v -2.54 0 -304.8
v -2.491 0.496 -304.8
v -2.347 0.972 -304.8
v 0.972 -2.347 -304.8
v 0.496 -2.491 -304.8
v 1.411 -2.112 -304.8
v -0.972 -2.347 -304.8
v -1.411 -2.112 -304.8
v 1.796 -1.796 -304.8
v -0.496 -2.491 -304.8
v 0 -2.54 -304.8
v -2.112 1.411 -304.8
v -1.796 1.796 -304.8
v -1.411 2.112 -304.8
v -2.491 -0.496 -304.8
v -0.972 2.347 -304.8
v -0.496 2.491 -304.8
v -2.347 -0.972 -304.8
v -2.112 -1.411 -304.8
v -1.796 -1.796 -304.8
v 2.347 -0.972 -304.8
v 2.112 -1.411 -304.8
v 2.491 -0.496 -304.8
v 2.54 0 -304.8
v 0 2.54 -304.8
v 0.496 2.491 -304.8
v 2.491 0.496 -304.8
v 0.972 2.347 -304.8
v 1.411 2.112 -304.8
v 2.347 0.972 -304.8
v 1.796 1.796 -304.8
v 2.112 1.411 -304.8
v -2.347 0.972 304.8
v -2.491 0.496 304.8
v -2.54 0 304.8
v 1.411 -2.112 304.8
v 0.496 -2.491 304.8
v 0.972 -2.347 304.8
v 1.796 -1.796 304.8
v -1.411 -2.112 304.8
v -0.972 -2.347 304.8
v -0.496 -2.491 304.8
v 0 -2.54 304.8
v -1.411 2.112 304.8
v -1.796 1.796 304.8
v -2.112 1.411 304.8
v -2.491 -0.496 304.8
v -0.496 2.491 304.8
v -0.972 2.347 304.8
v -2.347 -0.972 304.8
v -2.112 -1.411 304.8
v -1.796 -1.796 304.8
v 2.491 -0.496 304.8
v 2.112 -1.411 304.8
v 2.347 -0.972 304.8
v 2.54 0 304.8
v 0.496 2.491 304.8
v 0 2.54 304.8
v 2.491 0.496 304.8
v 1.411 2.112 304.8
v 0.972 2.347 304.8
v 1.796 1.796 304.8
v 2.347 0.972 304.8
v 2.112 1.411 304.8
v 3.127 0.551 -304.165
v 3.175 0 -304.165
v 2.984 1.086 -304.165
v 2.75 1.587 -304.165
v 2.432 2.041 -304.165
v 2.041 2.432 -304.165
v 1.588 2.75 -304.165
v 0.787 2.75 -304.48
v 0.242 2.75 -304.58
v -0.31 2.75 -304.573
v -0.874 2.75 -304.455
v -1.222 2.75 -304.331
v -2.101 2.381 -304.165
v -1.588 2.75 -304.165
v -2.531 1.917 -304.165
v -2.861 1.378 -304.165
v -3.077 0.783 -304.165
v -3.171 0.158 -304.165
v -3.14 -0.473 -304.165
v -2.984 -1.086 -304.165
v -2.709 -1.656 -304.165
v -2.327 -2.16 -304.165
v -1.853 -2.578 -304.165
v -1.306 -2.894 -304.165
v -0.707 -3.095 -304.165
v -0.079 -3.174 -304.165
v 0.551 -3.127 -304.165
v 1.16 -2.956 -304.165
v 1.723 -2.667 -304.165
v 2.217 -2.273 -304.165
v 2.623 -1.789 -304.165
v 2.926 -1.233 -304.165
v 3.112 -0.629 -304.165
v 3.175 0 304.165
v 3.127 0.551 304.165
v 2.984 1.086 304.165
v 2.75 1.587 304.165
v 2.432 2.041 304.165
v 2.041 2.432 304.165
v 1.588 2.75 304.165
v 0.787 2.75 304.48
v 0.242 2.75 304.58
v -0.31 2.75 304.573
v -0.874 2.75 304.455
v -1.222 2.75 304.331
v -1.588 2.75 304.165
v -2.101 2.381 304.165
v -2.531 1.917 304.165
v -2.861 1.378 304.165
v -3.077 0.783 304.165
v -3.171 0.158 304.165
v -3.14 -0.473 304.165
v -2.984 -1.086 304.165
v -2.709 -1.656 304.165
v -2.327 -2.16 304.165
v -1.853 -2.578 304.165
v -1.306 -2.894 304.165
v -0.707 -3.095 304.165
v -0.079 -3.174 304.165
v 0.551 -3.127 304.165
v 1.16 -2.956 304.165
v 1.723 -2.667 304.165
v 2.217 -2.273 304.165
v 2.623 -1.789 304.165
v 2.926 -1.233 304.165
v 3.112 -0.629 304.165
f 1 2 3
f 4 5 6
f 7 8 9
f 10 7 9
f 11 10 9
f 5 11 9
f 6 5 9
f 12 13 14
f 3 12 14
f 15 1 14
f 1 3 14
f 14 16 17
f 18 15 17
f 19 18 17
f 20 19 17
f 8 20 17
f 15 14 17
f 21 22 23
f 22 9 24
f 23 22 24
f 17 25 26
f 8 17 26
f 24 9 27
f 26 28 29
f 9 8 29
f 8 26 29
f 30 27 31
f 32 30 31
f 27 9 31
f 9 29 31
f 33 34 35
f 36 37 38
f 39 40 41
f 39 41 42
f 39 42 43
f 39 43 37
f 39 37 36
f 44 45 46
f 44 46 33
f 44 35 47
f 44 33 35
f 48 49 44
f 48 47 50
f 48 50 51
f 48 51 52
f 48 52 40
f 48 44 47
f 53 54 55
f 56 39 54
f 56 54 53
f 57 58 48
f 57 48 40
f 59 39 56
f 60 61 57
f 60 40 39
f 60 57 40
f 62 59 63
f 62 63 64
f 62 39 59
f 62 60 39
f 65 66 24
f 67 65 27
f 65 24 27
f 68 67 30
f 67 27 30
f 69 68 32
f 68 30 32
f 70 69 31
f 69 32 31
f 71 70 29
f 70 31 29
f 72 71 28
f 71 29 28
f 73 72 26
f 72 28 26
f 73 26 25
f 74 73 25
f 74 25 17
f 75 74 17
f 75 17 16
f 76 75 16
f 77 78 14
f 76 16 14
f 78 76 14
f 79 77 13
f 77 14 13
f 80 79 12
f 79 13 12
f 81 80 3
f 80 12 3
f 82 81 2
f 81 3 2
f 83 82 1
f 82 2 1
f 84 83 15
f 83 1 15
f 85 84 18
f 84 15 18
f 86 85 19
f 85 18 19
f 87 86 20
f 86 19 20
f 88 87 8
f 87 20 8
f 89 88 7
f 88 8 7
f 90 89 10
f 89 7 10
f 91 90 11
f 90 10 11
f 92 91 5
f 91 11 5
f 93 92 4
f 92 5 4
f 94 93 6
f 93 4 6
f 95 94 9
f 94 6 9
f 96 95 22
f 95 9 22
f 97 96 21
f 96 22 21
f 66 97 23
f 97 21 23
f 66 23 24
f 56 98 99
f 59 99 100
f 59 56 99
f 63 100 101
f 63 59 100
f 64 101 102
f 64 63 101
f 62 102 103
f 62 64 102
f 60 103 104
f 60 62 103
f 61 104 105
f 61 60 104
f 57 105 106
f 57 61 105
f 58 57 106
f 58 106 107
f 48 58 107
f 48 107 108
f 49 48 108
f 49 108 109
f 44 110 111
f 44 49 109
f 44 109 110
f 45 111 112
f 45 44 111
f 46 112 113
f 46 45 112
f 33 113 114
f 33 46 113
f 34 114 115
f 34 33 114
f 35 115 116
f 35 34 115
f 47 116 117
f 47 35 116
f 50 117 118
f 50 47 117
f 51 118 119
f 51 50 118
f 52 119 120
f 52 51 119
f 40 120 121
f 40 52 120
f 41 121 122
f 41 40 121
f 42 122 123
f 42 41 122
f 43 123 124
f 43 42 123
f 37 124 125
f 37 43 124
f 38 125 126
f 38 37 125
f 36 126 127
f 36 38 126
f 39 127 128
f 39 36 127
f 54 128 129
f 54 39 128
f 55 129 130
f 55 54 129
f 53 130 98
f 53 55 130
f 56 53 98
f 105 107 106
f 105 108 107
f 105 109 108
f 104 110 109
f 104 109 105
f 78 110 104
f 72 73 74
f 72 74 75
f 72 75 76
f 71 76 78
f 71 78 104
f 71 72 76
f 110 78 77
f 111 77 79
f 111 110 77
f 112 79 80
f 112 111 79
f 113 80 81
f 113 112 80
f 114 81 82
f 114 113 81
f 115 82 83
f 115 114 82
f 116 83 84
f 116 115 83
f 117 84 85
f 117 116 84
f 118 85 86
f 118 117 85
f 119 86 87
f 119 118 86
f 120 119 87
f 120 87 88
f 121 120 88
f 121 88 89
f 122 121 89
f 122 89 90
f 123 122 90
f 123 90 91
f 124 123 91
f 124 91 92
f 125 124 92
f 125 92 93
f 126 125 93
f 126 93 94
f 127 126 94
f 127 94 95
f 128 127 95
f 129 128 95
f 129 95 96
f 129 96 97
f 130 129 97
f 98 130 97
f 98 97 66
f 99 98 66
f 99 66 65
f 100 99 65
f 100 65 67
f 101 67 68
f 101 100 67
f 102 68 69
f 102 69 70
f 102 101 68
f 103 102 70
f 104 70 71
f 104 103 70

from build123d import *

# Parameters (mm, degrees)
SKETCH1_R           = 3.175
EXTRUDE1_DEPTH      = 304.8
CHAMFER1_SIZE       = 0.635
EXTRUDE7_DEPTH      = 305.8
EXTRUDE7_DEPTH_BACK = 305.8


with BuildPart() as part:
    # Sketch1 → Extrude1 (new body, symmetric)
    with BuildSketch(Plane.XY):
        Circle(SKETCH1_R)
    extrude(amount=EXTRUDE1_DEPTH, both=True)

    # Chamfer1
    chamfer1_edges = [part.edges().sort_by_distance(p)[0] for p in [
        (-3.175, 0, -304.8),
        (-3.175, 0, 304.8),
    ]]
    chamfer(chamfer1_edges, length=CHAMFER1_SIZE)

    # Sketch13 → Extrude7 (cut, two sides)
    with BuildSketch(Plane.XY) as extrude7_sk:
        with BuildLine():
            Line((-1.5875, 2.749630657), (1.5875, 2.749630657))
            ThreePointArc((1.5875, 2.749630657), (0, 3.175), (-1.5875, 2.749630657))
        make_face()
    extrude(amount=EXTRUDE7_DEPTH, mode=Mode.SUBTRACT)
    extrude(extrude7_sk.sketch, amount=-EXTRUDE7_DEPTH_BACK, mode=Mode.SUBTRACT)


solid = part.part
